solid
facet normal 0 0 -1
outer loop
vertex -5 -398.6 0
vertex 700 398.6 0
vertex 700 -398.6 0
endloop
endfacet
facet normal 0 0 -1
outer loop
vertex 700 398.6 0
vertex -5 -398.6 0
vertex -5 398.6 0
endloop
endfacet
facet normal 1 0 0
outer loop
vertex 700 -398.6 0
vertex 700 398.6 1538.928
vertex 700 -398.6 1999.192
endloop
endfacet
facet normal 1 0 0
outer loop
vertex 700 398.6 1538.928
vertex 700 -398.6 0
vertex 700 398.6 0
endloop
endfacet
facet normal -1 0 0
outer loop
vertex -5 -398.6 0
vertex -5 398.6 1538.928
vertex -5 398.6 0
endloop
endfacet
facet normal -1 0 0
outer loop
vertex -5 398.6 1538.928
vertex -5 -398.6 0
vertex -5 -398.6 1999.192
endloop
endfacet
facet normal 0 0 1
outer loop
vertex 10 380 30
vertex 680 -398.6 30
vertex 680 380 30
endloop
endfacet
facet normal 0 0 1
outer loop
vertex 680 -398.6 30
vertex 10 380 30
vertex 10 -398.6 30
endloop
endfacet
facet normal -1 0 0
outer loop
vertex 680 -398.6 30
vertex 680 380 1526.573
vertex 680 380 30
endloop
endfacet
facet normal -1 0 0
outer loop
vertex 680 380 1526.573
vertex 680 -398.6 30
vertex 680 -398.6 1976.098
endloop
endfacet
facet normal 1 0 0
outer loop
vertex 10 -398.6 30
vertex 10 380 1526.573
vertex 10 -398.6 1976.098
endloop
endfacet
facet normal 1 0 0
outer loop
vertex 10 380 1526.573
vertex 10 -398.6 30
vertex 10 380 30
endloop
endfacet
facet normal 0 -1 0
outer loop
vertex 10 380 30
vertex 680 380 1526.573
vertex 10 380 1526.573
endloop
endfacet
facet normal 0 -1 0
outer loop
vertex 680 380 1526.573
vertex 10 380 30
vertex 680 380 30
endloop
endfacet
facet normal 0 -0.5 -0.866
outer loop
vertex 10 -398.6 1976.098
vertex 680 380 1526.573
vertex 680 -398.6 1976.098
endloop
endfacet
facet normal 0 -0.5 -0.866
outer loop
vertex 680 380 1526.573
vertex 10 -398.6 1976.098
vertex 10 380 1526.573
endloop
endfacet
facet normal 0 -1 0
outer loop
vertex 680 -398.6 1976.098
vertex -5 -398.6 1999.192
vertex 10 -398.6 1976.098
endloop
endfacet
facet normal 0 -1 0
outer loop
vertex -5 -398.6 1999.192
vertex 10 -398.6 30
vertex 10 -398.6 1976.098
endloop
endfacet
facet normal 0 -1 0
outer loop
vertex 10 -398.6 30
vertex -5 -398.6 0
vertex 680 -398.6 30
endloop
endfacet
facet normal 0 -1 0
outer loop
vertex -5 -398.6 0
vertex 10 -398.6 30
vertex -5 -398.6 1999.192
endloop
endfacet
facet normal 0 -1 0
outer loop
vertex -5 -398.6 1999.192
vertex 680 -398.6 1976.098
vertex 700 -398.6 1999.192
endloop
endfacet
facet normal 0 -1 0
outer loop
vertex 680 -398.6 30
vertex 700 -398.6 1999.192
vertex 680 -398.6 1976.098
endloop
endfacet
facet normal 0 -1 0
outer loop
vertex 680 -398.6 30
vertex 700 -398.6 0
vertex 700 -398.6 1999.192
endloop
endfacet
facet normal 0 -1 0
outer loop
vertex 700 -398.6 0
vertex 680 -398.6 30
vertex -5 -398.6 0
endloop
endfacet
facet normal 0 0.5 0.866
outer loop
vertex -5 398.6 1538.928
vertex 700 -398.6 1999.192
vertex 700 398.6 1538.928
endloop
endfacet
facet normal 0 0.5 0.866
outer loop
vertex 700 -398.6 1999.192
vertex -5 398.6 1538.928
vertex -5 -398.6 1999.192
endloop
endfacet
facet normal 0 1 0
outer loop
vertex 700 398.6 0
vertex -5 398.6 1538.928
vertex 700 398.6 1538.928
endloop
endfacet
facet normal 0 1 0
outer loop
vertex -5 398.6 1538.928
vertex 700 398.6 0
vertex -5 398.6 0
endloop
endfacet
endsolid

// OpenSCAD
cabin_width=1400;
cabin_depth=800;
cabin_height=2000;
cabin_wall_thickness=20;
cabin_bottom_thickness=30;
cabin_roof_slope=30;

// initial camera distance, rotation and translation
$vpd=10000;
$vpr=[75,0,315];
$vpt=[0,0,1000];

module halfcabin(
    cw=cabin_width,
    cd=cabin_depth,
    ch=cabin_height,
    cwt=cabin_wall_thickness,
    cbt=cabin_bottom_thickness,
    crf=cabin_roof_slope,

){
     module roof() {
            rotate([0,0,-crf])
            translate([-cwt,0,0])
            cube([2*cwt,1.6*cd,(cw+cwt)/2-cwt/4]);
        }
        
        module openbox() {      
            difference(){
                cube([ch,cd,(cw+cwt)/2-cwt/4]);
                translate([-cbt,-cwt,cwt-cwt/4])
                    cube([ch,cd,(cw+cwt)/2-2*cwt]);
            }
        }
        module slicers() {
            union() {
                // front slicer
                translate([-cw/2,-0.999*cw,-cwt])
                    cube([2*cw,cw,cw]);
                // top slicer
                rotate([0,0,-crf])
                    translate([-cw,-cwt,-cwt])
                        cube([cw,cw,cw]);
                // back slicer
                translate([-cw/8,cd-0.001*cw,-cwt])
                cube([cw*2,cw,cw]);
            }
        } 
   
        rotate([0,90,0])
            translate([-ch,-cd/2,cwt/-4])

                difference() {
                    union() {
                        roof();
                        openbox();
                    }
                    slicers();
                }
      
}

halfcabin();
